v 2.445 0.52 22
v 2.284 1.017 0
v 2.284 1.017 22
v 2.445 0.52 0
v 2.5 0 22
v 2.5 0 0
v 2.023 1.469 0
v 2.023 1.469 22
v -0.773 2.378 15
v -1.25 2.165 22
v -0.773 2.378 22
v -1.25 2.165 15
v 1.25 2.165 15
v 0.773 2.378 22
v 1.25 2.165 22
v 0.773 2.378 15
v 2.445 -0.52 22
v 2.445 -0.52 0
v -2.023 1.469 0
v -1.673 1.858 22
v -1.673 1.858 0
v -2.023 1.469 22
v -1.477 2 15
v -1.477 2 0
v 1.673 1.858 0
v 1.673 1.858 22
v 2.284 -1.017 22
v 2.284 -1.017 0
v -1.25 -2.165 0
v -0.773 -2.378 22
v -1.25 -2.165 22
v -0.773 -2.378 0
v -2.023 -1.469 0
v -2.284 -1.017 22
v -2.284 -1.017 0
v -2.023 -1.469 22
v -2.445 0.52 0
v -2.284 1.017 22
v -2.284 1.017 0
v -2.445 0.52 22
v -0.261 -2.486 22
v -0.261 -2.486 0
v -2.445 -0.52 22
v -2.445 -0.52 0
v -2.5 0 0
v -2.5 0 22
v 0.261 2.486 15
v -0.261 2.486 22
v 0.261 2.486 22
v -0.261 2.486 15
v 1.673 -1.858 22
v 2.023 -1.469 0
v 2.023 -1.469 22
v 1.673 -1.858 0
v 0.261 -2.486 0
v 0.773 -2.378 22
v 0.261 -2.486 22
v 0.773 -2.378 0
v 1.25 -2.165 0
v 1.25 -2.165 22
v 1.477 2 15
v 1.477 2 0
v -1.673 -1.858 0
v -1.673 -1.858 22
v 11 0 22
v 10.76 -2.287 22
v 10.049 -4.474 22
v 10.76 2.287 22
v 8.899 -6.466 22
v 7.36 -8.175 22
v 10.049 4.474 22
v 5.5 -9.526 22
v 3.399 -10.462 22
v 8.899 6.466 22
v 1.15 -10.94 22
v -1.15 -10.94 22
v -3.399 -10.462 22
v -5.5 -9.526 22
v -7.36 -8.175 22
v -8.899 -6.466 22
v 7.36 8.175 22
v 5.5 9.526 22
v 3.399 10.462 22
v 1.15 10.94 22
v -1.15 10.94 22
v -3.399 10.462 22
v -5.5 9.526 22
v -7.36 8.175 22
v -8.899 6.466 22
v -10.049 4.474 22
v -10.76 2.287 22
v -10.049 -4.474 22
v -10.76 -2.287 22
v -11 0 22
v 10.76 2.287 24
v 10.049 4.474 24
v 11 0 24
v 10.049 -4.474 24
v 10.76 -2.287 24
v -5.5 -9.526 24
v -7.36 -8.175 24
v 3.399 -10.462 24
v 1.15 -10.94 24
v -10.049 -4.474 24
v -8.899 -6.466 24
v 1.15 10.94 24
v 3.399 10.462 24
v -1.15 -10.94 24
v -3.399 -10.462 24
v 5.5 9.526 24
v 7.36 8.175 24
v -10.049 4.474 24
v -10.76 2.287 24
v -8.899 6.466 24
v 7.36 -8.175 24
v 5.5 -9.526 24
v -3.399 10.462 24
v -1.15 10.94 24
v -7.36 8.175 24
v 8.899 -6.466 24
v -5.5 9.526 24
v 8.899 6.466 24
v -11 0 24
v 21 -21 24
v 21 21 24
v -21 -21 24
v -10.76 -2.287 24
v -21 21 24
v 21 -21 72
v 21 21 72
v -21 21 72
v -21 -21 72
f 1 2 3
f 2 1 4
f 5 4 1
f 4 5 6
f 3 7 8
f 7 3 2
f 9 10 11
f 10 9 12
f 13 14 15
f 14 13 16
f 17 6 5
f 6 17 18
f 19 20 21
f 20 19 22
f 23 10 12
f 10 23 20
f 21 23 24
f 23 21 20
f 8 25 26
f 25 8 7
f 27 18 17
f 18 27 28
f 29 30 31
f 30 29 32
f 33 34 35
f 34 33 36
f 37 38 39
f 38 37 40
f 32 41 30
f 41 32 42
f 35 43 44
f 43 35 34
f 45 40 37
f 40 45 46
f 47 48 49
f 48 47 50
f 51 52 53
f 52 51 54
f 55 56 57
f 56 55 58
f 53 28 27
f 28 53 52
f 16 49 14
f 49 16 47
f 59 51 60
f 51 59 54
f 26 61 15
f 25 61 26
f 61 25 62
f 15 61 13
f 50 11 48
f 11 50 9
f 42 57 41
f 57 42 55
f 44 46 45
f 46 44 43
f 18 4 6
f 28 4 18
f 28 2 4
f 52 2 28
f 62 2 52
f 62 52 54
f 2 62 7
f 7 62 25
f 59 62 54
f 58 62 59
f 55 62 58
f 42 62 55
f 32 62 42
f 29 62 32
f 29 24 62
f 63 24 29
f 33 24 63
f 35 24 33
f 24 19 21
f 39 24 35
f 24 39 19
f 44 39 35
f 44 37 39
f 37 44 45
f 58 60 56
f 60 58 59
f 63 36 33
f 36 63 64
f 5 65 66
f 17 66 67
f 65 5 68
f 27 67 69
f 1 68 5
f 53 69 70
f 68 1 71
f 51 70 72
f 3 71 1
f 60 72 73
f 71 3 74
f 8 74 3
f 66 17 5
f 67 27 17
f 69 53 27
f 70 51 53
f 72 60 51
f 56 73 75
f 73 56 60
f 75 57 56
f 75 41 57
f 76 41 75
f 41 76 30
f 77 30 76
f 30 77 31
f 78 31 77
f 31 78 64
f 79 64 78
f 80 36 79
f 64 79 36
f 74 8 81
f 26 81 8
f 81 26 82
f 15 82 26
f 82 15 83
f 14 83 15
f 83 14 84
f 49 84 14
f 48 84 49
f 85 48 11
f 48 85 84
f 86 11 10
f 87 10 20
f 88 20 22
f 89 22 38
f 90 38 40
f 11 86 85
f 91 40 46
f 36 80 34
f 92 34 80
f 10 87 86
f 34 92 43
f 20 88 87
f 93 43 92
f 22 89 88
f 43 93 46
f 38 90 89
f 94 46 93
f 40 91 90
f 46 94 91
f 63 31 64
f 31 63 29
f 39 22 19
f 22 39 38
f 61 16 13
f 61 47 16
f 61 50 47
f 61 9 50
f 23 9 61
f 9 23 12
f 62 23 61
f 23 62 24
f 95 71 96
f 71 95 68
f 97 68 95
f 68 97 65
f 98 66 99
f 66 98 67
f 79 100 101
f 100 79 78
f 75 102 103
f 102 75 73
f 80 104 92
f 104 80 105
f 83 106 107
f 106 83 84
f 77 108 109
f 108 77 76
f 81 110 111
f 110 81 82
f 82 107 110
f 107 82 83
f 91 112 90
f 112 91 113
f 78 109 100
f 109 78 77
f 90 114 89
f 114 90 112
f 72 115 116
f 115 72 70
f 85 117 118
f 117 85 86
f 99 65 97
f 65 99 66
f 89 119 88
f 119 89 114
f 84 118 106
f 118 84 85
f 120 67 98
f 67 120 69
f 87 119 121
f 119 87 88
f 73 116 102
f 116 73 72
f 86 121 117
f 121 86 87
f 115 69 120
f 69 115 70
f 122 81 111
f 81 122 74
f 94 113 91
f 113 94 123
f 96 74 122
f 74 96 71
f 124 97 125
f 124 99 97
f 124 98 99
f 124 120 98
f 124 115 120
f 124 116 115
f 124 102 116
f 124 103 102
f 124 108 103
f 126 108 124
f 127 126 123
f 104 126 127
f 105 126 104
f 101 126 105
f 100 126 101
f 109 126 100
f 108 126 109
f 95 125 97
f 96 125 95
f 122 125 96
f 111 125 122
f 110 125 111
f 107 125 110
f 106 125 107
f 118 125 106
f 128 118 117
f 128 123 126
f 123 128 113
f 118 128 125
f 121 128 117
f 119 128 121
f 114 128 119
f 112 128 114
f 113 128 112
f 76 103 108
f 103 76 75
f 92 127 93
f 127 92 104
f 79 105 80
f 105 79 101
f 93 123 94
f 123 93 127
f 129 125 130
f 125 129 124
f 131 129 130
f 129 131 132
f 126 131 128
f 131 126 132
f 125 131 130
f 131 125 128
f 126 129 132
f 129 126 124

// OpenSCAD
function motor_shaft_cut_length() = 15;
function motor_shaft_length() = 22;
function motor_box_height() = 48;
function motor_box_length() = 42;

module motor_shaft(tolerance = 0) {
	shaft_length = motor_shaft_length();
	shaft_radius = 2.5 + tolerance;
	cut_length = motor_shaft_cut_length();
	cut_thickness = 0.5;
	$fs = 0.01;

	difference() {
		cylinder(h=shaft_length, r=shaft_radius);
		translate([-5, shaft_radius-cut_thickness, 0]) {
			cube([10, cut_thickness, cut_length]);
		}
	}
}

module motor_body() {
	cube([motor_box_length(), motor_box_length(), motor_box_height()]);
}

motor_shaft();

translate([0, 0, motor_shaft_length()]) {
	cylinder(h = 2, r = 11);
	translate([-motor_box_length()/2, -motor_box_length()/2, 2]) {
		motor_body();
	}
}
